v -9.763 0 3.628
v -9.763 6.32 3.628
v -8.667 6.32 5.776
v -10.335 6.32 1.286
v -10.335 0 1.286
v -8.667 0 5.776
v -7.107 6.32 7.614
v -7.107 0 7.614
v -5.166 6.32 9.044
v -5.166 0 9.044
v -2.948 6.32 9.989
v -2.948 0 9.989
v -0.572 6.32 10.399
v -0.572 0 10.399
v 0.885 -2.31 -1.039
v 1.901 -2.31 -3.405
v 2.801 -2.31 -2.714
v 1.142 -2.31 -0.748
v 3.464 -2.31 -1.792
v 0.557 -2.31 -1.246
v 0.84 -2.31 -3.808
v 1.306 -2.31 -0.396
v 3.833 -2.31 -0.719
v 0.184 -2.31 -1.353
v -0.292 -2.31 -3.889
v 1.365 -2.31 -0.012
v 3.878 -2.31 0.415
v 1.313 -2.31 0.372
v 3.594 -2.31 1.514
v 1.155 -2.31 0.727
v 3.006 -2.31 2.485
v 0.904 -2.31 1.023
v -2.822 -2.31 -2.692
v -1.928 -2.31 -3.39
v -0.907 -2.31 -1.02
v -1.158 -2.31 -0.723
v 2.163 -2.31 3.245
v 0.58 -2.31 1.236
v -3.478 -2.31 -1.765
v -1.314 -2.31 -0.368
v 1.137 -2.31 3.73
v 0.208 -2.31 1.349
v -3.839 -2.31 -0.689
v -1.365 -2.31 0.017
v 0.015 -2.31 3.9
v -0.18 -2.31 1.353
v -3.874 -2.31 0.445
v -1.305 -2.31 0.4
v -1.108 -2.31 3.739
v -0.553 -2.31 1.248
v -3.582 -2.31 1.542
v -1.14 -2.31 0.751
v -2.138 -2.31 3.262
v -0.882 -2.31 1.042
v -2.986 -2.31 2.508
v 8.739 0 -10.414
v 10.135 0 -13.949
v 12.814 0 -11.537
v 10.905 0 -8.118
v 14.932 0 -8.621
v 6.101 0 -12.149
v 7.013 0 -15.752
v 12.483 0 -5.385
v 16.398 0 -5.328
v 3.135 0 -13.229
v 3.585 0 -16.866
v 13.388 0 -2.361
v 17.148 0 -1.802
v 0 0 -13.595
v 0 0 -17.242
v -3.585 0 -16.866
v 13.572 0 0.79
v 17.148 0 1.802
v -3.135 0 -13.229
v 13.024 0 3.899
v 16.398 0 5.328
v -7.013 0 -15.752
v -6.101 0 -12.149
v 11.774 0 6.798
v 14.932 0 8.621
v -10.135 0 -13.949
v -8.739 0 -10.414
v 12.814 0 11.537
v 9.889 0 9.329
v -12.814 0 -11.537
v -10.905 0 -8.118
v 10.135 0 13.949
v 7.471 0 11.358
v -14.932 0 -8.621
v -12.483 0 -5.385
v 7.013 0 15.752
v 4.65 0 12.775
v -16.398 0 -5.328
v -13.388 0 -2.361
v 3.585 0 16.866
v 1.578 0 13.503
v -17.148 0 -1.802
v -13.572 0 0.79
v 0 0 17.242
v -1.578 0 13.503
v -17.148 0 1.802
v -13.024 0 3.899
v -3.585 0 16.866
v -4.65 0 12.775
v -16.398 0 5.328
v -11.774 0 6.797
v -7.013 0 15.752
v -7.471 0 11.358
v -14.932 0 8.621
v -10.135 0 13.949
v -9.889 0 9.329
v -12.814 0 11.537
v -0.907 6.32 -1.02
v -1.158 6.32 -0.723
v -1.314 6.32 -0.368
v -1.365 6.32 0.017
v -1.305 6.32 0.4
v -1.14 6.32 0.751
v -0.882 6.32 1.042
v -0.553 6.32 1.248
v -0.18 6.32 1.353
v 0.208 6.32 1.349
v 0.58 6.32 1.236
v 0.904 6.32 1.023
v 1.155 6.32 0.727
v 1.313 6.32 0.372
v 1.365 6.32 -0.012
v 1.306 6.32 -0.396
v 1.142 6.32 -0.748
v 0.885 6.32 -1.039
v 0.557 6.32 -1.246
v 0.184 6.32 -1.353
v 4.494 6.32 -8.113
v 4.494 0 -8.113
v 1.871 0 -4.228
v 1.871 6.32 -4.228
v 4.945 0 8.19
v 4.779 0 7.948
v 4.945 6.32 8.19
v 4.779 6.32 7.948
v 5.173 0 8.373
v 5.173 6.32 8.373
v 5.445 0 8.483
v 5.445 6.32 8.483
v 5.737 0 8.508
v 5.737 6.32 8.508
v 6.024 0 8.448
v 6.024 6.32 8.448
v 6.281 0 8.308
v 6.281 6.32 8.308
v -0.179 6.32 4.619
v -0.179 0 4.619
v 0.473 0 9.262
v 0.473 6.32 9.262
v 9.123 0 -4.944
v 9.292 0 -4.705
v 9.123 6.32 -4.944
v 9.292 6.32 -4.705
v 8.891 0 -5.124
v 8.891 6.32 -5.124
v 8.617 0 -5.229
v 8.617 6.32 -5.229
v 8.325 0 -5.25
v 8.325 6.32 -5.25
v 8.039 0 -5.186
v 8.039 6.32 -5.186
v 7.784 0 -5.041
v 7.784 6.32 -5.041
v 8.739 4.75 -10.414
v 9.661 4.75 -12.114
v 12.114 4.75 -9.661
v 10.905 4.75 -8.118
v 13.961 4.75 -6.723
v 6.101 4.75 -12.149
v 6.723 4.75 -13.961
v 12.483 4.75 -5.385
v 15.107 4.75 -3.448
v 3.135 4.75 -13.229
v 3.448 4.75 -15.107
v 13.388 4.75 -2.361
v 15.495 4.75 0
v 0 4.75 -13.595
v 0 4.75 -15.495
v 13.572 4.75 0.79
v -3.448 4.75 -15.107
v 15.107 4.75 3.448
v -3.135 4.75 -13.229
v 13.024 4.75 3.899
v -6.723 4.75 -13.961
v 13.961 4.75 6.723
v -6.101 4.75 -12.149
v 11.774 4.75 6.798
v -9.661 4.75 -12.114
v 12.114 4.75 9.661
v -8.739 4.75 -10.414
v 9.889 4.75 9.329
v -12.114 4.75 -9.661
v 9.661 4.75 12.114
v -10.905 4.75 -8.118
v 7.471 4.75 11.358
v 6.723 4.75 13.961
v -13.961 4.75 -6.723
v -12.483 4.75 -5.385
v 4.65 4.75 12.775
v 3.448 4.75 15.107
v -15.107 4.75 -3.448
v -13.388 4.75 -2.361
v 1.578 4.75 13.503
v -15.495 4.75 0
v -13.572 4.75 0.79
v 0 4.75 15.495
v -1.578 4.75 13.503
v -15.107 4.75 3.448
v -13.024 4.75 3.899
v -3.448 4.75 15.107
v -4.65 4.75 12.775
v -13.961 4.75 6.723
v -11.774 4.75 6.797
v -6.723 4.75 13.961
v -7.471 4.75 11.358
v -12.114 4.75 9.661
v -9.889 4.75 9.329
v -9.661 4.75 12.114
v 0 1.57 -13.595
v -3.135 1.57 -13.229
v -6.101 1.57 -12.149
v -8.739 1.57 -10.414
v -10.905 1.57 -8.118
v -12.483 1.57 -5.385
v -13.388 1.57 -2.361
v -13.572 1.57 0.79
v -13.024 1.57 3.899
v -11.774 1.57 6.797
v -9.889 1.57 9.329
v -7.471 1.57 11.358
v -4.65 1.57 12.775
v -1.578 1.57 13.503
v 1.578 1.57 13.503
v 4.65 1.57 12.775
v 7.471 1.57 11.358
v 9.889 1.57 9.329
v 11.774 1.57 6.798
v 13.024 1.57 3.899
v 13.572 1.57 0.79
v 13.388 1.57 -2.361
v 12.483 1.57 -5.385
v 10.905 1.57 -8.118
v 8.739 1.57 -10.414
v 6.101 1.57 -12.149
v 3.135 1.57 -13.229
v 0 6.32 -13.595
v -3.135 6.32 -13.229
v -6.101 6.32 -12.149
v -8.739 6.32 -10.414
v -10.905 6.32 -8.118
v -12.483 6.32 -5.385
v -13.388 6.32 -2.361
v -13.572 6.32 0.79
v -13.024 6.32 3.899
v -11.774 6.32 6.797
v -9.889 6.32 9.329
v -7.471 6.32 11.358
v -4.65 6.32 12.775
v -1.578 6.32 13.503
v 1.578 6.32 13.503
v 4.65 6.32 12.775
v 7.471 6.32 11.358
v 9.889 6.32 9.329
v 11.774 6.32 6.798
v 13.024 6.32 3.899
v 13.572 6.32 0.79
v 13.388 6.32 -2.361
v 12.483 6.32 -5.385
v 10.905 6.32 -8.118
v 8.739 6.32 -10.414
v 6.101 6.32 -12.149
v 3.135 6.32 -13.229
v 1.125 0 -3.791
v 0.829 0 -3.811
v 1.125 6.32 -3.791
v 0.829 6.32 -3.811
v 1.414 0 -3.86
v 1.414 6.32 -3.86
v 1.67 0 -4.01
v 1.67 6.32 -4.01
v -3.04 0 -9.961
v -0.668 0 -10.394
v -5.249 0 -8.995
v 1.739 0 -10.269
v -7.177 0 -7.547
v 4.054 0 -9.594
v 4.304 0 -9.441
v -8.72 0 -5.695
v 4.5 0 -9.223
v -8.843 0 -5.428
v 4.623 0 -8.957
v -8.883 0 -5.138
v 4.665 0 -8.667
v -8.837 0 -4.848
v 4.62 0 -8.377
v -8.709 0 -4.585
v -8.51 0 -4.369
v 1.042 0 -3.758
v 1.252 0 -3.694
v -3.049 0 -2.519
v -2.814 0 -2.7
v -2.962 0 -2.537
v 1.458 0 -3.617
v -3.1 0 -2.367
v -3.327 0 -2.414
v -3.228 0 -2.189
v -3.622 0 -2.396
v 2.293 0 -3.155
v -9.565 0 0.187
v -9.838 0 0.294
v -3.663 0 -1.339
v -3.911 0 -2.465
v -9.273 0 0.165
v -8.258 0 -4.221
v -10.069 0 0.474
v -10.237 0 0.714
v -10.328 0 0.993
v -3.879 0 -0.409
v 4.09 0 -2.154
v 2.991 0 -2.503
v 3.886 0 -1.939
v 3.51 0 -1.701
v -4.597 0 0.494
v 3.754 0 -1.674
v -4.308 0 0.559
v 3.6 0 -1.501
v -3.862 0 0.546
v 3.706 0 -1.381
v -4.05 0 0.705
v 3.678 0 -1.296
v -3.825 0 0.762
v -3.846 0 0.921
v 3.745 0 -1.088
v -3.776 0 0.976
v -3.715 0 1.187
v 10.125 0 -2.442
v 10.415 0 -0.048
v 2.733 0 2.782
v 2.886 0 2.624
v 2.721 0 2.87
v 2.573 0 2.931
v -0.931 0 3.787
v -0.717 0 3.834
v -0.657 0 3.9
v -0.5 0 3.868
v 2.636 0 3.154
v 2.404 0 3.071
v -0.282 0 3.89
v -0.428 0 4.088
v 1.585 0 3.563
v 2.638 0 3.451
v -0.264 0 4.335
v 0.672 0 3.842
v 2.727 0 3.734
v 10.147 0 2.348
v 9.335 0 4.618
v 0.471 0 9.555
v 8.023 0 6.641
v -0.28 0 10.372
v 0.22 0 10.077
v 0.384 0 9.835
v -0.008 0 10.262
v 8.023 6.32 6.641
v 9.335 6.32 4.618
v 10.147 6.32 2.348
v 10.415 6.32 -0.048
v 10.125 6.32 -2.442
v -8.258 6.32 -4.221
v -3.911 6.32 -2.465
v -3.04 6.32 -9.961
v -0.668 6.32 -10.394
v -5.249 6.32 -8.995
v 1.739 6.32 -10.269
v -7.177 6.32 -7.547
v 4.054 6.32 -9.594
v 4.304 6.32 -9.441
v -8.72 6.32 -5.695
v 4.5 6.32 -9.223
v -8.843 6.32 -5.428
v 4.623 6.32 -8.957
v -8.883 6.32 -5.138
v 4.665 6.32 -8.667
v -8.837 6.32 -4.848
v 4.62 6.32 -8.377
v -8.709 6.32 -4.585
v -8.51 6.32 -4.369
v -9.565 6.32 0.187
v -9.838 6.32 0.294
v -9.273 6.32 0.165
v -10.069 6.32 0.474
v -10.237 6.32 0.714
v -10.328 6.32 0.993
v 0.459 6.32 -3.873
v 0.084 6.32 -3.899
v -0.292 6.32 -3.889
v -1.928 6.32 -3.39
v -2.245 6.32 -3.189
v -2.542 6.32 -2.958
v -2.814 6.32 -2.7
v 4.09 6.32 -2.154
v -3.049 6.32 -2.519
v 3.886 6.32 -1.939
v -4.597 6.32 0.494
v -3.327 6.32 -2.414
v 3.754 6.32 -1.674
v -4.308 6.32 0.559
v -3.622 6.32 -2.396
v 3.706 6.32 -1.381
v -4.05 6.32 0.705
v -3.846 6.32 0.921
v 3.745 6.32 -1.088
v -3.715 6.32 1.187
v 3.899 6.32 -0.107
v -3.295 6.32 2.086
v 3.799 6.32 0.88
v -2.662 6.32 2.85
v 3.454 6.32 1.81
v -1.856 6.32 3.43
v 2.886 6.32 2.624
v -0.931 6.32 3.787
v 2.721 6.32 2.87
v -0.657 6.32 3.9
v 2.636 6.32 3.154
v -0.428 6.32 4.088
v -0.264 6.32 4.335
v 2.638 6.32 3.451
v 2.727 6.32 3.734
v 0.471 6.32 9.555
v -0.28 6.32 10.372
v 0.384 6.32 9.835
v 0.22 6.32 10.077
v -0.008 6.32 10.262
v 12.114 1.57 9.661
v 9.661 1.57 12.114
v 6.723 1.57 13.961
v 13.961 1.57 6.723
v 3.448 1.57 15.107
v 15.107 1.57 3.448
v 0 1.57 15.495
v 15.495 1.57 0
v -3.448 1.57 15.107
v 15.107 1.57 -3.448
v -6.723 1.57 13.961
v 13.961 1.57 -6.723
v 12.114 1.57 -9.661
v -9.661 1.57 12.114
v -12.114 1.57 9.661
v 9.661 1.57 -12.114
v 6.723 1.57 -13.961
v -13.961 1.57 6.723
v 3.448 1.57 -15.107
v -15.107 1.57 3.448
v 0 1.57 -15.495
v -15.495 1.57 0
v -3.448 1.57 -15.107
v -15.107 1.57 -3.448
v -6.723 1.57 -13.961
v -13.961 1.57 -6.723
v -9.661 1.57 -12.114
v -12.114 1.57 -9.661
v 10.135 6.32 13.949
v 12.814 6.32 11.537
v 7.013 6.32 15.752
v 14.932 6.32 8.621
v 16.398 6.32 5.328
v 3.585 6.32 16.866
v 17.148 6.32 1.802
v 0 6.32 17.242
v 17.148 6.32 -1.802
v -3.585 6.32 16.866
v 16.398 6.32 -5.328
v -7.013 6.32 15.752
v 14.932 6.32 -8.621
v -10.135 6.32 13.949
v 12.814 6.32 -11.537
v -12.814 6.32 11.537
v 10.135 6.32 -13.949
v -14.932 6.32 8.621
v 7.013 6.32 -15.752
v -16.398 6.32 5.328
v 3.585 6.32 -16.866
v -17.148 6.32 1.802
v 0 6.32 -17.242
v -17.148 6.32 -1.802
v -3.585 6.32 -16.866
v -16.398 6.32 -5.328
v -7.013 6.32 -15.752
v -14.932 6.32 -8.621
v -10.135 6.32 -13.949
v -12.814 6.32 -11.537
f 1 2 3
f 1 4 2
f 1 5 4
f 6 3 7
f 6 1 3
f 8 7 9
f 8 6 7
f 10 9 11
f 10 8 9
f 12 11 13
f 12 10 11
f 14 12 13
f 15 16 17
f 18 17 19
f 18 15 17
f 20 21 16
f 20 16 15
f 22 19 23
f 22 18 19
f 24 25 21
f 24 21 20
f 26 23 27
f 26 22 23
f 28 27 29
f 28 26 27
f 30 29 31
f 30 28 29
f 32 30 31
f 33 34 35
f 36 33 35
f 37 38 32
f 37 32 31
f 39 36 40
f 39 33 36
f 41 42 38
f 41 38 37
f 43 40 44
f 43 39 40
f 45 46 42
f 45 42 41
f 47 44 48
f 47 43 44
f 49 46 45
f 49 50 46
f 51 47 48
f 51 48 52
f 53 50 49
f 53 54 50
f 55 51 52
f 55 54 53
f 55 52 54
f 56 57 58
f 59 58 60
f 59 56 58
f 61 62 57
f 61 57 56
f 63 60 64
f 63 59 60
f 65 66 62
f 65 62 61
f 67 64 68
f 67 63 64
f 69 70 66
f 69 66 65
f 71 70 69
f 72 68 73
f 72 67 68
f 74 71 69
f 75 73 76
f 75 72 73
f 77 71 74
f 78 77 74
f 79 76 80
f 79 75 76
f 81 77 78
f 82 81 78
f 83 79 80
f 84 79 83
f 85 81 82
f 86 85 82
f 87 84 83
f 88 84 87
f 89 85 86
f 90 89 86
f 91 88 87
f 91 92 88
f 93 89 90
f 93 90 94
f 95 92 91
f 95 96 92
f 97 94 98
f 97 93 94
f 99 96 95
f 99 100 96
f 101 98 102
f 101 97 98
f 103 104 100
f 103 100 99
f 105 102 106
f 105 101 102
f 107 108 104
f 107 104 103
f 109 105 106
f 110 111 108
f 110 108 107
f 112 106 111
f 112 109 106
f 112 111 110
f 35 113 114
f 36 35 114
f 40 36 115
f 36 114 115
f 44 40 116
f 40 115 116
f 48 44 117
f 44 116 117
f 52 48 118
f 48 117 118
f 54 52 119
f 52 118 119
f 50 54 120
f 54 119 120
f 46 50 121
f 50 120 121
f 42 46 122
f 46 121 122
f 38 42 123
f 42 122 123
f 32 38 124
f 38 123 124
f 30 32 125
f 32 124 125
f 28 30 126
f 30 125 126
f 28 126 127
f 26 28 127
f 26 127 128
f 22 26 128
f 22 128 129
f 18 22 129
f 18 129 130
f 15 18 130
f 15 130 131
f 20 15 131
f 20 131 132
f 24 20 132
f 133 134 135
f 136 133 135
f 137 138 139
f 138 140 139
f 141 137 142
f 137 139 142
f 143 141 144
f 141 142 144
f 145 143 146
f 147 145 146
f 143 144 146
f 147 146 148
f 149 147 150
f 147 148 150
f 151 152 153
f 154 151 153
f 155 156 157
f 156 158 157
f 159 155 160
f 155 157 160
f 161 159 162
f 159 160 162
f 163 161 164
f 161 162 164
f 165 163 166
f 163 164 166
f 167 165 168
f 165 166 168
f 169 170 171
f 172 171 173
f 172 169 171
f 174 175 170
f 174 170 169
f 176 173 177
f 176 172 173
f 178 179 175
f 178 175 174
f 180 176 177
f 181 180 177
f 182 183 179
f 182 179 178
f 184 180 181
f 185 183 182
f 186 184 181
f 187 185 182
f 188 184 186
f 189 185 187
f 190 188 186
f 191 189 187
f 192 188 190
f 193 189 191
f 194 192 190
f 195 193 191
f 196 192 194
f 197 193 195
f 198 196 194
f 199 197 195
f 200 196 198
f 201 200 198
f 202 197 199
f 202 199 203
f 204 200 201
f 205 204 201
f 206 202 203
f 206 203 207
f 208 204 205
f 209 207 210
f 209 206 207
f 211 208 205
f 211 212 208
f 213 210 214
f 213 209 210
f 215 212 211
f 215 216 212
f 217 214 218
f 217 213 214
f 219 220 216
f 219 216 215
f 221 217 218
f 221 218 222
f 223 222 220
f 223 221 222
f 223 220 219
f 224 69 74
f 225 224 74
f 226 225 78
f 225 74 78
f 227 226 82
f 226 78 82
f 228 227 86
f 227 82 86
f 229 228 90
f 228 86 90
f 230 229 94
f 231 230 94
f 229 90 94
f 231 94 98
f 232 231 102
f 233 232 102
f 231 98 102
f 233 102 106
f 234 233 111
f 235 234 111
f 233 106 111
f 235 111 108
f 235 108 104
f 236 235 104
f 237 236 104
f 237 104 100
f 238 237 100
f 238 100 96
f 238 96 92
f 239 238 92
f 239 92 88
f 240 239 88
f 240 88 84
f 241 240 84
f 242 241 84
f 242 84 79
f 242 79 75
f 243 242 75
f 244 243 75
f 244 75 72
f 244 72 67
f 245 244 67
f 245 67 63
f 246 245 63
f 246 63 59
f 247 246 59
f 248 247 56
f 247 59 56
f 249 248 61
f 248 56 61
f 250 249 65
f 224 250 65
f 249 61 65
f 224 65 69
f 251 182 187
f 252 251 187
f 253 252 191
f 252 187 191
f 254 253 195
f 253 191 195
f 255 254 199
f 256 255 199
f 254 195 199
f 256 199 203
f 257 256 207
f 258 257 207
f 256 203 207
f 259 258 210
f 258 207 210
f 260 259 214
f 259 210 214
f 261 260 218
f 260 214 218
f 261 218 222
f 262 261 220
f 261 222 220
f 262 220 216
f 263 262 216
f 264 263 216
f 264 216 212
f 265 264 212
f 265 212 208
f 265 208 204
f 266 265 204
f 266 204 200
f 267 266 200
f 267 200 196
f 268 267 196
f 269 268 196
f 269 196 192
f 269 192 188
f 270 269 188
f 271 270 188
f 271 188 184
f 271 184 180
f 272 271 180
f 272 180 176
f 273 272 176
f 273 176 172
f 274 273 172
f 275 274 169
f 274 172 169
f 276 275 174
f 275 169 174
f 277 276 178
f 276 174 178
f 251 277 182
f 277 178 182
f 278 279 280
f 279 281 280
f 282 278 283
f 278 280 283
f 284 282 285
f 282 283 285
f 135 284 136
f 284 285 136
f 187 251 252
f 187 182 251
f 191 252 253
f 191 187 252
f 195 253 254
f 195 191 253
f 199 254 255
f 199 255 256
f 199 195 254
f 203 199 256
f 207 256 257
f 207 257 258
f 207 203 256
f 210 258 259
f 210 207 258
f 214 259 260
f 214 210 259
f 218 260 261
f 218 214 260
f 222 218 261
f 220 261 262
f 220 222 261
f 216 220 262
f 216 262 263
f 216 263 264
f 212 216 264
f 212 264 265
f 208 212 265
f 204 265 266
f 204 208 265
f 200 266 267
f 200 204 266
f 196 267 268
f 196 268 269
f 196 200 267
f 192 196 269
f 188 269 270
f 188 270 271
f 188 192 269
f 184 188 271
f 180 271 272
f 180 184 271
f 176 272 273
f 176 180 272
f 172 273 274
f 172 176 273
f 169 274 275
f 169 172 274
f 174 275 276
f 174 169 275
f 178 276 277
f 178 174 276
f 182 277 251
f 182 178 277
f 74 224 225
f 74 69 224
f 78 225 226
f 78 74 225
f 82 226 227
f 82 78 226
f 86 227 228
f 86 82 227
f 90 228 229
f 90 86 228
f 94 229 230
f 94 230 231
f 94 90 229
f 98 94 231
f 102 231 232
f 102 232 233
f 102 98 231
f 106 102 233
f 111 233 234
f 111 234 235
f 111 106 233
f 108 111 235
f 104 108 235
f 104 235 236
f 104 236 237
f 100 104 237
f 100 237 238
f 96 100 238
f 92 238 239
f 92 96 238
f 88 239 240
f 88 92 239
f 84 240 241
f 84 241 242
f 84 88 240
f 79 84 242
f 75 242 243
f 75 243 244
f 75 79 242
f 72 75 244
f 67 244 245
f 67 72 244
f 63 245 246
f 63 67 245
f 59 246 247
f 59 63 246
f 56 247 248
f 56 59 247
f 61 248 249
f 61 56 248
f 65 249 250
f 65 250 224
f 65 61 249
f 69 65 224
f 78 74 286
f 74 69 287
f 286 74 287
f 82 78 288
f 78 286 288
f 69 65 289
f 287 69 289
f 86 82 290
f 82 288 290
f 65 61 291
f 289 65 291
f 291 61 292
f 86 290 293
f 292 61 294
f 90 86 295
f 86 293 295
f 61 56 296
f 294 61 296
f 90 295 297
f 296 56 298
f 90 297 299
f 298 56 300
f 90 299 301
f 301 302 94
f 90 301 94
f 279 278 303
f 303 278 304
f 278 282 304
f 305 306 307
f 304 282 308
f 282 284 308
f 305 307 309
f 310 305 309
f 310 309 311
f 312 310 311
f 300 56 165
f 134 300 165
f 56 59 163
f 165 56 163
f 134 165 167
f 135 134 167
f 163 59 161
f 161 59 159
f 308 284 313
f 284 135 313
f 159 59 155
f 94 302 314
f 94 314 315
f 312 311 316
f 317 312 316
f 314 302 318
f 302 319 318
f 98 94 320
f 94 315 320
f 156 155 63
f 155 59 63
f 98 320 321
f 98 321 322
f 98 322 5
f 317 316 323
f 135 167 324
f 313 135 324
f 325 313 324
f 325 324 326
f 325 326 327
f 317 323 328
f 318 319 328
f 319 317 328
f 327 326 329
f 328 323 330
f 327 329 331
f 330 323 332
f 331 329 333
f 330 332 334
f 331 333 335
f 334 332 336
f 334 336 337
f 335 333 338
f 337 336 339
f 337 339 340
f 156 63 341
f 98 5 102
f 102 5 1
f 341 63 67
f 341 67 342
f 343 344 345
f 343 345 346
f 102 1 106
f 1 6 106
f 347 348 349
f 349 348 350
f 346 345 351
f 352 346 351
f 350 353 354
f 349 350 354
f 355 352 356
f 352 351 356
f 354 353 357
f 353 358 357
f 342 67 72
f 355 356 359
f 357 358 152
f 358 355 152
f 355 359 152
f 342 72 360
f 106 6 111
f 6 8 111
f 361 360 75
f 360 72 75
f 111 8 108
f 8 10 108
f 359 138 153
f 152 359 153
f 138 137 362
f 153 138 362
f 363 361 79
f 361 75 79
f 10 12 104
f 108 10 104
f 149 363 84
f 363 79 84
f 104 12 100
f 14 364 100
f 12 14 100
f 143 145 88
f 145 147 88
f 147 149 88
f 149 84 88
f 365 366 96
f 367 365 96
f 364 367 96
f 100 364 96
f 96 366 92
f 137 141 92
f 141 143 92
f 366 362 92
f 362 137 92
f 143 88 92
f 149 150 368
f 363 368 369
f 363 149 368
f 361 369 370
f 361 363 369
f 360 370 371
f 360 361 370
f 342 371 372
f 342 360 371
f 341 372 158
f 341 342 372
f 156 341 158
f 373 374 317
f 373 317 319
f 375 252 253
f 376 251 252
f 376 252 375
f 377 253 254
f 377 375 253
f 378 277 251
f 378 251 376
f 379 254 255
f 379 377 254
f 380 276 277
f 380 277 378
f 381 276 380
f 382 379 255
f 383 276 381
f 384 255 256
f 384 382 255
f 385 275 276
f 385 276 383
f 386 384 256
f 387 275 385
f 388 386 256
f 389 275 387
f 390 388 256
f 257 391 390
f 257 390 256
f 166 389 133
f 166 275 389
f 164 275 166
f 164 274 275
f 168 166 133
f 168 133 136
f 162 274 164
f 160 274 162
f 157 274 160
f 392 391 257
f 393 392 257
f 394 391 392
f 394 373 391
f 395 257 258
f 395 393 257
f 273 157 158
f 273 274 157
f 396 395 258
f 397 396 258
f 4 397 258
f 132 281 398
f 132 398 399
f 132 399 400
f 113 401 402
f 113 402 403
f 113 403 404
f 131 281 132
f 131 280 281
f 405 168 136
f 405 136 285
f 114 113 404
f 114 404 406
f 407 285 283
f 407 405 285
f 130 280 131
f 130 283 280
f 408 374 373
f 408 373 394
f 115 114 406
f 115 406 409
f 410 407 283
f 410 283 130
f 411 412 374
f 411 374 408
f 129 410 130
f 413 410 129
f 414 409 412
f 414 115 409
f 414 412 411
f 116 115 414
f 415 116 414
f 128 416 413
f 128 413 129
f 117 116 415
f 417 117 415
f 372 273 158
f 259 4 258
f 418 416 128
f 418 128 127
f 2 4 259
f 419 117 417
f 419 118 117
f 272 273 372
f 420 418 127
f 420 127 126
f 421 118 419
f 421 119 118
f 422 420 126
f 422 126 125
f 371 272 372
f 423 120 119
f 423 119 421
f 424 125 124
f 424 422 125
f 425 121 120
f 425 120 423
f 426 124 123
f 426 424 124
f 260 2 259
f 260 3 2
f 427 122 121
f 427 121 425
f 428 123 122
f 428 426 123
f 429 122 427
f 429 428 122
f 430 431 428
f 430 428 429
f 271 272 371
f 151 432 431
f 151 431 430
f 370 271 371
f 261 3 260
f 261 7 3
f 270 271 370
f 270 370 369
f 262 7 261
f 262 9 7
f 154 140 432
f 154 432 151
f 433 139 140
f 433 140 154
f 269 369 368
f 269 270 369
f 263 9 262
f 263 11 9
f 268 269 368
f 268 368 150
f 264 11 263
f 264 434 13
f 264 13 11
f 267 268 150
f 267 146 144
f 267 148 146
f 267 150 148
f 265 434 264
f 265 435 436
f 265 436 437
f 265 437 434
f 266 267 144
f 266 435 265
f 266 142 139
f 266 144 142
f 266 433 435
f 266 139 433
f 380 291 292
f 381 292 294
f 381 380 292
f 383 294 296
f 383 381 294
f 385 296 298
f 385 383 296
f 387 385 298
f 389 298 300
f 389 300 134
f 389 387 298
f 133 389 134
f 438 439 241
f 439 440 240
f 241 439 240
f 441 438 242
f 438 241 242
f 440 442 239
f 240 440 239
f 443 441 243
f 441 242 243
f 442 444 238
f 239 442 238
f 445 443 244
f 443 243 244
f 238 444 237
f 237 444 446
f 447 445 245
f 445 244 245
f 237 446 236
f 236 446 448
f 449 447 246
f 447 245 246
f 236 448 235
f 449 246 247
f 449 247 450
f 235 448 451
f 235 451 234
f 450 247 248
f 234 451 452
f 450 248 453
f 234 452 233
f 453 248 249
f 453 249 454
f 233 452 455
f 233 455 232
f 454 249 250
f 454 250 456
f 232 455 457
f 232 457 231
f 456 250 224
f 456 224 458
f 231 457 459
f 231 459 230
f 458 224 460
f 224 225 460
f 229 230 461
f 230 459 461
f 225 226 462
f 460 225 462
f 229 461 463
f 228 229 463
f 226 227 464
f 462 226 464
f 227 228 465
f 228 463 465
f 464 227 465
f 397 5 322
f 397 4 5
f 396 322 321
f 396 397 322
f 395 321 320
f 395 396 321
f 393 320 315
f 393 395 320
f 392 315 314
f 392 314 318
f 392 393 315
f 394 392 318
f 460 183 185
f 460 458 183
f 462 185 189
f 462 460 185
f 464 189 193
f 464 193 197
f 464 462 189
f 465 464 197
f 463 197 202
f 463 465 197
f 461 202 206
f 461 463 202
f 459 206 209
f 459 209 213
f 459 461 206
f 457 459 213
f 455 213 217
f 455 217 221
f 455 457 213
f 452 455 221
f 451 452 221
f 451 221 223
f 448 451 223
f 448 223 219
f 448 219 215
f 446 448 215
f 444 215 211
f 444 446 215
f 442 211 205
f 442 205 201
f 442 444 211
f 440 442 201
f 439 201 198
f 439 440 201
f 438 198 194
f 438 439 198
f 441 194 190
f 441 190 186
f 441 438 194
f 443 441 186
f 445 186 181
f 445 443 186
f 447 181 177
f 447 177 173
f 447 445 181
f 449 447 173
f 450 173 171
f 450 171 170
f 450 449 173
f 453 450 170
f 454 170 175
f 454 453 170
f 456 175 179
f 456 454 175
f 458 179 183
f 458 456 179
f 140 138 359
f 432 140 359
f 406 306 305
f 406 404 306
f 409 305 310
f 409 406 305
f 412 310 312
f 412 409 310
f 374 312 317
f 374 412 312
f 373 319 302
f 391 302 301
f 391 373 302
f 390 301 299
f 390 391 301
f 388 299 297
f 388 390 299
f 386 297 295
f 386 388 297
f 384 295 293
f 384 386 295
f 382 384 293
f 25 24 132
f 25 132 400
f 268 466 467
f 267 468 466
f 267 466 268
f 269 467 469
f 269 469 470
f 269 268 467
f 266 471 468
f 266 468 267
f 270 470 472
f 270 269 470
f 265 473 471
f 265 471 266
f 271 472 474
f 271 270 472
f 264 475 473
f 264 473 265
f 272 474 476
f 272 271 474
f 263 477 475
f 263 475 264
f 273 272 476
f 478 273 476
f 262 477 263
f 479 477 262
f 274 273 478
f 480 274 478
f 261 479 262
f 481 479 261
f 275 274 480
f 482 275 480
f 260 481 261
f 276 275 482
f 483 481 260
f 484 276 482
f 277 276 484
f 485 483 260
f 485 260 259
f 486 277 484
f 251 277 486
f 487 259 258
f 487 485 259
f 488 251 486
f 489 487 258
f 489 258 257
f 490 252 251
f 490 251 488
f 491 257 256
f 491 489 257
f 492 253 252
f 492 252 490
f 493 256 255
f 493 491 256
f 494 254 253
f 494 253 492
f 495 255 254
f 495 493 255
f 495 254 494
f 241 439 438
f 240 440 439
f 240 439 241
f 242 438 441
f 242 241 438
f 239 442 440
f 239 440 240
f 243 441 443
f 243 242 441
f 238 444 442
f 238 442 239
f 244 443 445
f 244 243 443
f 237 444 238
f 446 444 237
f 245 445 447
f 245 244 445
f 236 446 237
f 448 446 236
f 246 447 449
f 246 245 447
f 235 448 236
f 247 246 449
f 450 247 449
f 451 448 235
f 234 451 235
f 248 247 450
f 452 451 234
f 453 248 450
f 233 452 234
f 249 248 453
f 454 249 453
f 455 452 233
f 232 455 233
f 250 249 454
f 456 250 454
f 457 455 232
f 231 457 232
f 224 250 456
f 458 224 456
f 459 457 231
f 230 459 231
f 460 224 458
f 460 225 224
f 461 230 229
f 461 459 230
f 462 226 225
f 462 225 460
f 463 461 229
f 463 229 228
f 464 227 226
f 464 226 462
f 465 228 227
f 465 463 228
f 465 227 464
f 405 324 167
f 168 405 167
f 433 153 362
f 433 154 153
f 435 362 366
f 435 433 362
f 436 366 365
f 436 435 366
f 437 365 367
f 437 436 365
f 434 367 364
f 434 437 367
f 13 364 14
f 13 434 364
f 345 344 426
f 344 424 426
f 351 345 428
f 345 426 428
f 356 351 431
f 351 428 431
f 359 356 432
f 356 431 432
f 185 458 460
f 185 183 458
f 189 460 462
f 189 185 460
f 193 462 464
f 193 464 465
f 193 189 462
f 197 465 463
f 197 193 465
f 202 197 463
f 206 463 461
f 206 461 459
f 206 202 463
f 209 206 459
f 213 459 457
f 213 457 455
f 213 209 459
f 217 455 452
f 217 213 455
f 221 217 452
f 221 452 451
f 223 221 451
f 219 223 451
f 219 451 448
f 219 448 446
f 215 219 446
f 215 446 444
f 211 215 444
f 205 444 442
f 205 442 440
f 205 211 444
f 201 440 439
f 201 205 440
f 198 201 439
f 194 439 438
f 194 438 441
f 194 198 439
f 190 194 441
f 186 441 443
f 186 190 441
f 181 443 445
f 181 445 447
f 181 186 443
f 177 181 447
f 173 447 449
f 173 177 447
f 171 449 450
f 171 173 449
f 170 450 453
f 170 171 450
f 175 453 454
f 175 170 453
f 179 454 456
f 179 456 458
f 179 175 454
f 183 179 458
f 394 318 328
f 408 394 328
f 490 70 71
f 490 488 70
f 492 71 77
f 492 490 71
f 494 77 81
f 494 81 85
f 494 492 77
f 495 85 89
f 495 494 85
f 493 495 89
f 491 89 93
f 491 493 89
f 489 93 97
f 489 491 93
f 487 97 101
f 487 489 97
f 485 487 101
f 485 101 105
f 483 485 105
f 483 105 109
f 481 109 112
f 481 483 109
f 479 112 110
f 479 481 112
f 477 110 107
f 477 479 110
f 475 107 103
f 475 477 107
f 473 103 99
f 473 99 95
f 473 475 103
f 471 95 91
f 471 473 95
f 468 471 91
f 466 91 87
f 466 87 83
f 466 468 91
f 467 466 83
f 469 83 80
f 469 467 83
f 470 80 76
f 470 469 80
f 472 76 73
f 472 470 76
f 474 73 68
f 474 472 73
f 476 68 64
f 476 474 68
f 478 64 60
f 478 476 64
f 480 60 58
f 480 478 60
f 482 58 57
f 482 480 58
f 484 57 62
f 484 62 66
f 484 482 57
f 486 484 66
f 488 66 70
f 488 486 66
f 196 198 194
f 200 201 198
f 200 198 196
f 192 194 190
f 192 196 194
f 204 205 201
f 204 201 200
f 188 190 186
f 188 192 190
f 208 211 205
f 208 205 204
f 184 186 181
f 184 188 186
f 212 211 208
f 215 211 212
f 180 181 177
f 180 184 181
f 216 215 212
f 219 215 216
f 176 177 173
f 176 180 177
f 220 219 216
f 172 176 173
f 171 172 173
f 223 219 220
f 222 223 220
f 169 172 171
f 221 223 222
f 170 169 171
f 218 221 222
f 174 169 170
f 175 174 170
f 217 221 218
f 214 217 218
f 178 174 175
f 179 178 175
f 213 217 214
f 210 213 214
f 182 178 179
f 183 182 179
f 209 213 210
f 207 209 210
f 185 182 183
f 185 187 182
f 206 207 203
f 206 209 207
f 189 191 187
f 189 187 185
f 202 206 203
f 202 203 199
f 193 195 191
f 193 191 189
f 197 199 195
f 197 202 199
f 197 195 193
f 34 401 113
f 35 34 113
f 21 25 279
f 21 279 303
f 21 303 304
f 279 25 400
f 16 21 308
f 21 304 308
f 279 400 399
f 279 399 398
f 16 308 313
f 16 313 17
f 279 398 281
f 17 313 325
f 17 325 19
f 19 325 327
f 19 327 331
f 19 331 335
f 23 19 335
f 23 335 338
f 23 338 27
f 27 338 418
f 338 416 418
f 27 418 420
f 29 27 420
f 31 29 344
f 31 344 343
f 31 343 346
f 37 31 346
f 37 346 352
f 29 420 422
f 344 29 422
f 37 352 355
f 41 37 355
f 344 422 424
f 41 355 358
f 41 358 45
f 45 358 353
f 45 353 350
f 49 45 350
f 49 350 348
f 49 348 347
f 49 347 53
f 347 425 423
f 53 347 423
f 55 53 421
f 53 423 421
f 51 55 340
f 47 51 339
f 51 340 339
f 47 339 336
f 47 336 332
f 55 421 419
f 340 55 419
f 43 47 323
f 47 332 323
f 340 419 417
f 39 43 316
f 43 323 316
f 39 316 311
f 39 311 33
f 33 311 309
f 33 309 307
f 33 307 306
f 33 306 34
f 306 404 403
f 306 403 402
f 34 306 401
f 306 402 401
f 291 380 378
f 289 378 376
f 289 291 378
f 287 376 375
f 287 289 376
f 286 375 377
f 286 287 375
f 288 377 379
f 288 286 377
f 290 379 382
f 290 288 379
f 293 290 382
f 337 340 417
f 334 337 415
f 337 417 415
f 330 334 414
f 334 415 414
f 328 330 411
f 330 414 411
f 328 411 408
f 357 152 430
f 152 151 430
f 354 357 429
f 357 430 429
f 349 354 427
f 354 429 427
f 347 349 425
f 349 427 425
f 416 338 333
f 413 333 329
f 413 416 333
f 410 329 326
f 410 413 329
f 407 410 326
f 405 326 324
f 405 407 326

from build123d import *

# Parameters (mm, degrees)
SKETCH1_R           = 13.595
SKETCH1_R_2         = 10.415
BOSS_EXTRUDE1_DEPTH = 6.32
SKETCH2_W           = 1.9
SKETCH2_H           = 3.18
SKETCH3_R           = 3.9
BOSS_EXTRUDE2_DEPTH = 6.32
SKETCH4_R           = 3.9
BOSS_EXTRUDE3_DEPTH = 2.31
SKETCH5_R           = 1.365
CUT_EXTRUDE1_DEPTH  = 8.63
BOSS_EXTRUDE4_START = -6.32
BOSS_EXTRUDE4_DEPTH = 6.32
CIRPATTERN2_COUNT   = 3
FILLET2_R           = 1
FILLET3_R           = 1
CUT_EXTRUDE2_DEPTH  = 25.31


with BuildPart() as part:
    # Sketch1 → Boss-Extrude1 (new body)
    with BuildSketch(Plane(origin=(0, 0, 0), x_dir=(1, 0, 0), z_dir=(0, 1, 0))):
        with Locations(Location((0, 0, 0), (0, 0, 90))):
            Circle(SKETCH1_R)
        with Locations(Location((0, 0, 0), (0, 0, 90))):
            Circle(SKETCH1_R_2, mode=Mode.SUBTRACT)
    extrude(amount=BOSS_EXTRUDE1_DEPTH)

    # Sketch2 → Revolve1 (revolve)
    with BuildSketch(Plane.XY, mode=Mode.PRIVATE) as revolve1_sk:
        with Locations((-14.545, 3.16)):
            Rectangle(SKETCH2_W, SKETCH2_H)
    revolve(revolve1_sk.sketch.rotate(Axis((0, 0, 0), (0, 1, 0)), 270), axis=Axis((0, 0, 0), (0, 1, 0)))



with BuildPart() as body_2:
    # Sketch3 → Boss-Extrude2 (new body)
    with BuildSketch(Plane(origin=(0, 6.32, 0), x_dir=(1, 0, 0), z_dir=(0, 1, 0))):
        with Locations(Location((0, 0, 0), (0, 0, 270))):
            Circle(SKETCH3_R)
    extrude(amount=-BOSS_EXTRUDE2_DEPTH)

    # Sketch4 → Boss-Extrude3 (add)
    with BuildSketch(Plane.XZ):
        with Locations(Location((0, 0, 0), (0, 0, 90))):
            Circle(SKETCH4_R)
    extrude(amount=BOSS_EXTRUDE3_DEPTH)

    # Sketch5 → Cut-Extrude1 (cut)
    with BuildSketch(Plane(origin=(0, 6.32, 0), x_dir=(1, 0, 0), z_dir=(0, 1, 0))):
        with Locations(Location((0, 0, 0), (0, 0, 270))):
            Circle(SKETCH5_R)
    extrude(amount=-CUT_EXTRUDE1_DEPTH, mode=Mode.SUBTRACT)


with BuildPart() as part_1:
    add(part.part)

    add(body_2.part)  # Boss-Extrude4 merges body 2
    # Sketch6 → Boss-Extrude4 (add)
    with BuildSketch(Plane(origin=(0, 6.32, 0), x_dir=(1, 0, 0), z_dir=(0, 1, 0)).offset(BOSS_EXTRUDE4_START)):
        with BuildLine():
            Line((5.134171789, 9.06159506), (1.457981988, 3.617221105))
            ThreePointArc((1.457981988, 3.617221105), (2.66219063, 2.850042289), (3.509570899, 1.700856286))
            Line((3.509570899, 1.700856286), (8.68650056, 5.746036288))
            ThreePointArc((8.68650056, 5.746036288), (7.106404051, 7.61388511), (5.134171789, 9.06159506))
        make_face()
    boss_extrude4 = extrude(amount=BOSS_EXTRUDE4_DEPTH)

    # CirPattern2: Boss-Extrude4 ×3 about axis
    cirpattern2_axis = Axis((0, 0, 0), (0, 1, 0))
    for i in range(1, CIRPATTERN2_COUNT):
        add(boss_extrude4.rotate(cirpattern2_axis, i * 360 / CIRPATTERN2_COUNT))

    # Fillet2
    fillet2_edges = [part_1.edges().sort_by_distance(p)[0] for p in [
        (0.632963116, 3.16, 10.395748299),
    ]]
    fillet(fillet2_edges, radius=FILLET2_R)

    # Fillet3
    fillet3_edges = [part_1.edges().sort_by_distance(p)[0] for p in [
        (5.134171789, 3.16, -9.06159506),
        (8.68650056, 3.16, -5.746036288),
        (3.509570899, 3.16, -1.700856286),
        (1.457981988, 3.16, -3.617221105),
        (-10.414657416, 3.16, 0.084474334),
        (-9.319463676, 3.16, -4.649712011),
        (-3.227770201, 3.16, -2.188949412),
        (-3.861596362, 3.16, 0.545961112),
        (5.280485627, 3.16, 8.977120727),
        (-0.281800697, 3.16, 3.889805698),
        (2.403614374, 3.16, 3.071259993),
    ]]
    fillet(fillet3_edges, radius=FILLET3_R)

    # Sketch7 → Cut-Extrude2 (cut)
    with BuildSketch(Plane(origin=(0, 6.32, 0), x_dir=(1, 0, 0), z_dir=(0, 1, 0))):
        with BuildLine():
            Line((-1.927864704, 3.390182544), (-0.907405589, 1.019725501))
            ThreePointArc((-0.907405589, 1.019725501), (-0.398121955, 1.305650761), (0.184050667, 1.352534788))
            Line((0.184050667, 1.352534788), (-0.291742117, 3.889072709))
            ThreePointArc((-0.291742117, 3.889072709), (-1.1374913, 3.730430745), (-1.927864704, 3.390182544))
        make_face()
    extrude(amount=-CUT_EXTRUDE2_DEPTH, mode=Mode.SUBTRACT)


with BuildPart() as body_2_2:
    # Sketch8 → Revolve4 (revolve)
    with BuildSketch(Plane.XY, mode=Mode.PRIVATE) as revolve4_sk:
        Polygon((-13.595, 4.75), (-15.495, 4.75), (-15.495, 1.57), (-13.595, 1.57), (-13.595, 0), (-17.242346631, 0), (-17.242346631, 6.32), (-13.595, 6.32), align=None)
    revolve(revolve4_sk.sketch.rotate(Axis((0, 0, 0), (0, 1, 0)), 270), axis=Axis((0, 0, 0), (0, 1, 0)))


solid = Compound([part_1.part, body_2_2.part])
